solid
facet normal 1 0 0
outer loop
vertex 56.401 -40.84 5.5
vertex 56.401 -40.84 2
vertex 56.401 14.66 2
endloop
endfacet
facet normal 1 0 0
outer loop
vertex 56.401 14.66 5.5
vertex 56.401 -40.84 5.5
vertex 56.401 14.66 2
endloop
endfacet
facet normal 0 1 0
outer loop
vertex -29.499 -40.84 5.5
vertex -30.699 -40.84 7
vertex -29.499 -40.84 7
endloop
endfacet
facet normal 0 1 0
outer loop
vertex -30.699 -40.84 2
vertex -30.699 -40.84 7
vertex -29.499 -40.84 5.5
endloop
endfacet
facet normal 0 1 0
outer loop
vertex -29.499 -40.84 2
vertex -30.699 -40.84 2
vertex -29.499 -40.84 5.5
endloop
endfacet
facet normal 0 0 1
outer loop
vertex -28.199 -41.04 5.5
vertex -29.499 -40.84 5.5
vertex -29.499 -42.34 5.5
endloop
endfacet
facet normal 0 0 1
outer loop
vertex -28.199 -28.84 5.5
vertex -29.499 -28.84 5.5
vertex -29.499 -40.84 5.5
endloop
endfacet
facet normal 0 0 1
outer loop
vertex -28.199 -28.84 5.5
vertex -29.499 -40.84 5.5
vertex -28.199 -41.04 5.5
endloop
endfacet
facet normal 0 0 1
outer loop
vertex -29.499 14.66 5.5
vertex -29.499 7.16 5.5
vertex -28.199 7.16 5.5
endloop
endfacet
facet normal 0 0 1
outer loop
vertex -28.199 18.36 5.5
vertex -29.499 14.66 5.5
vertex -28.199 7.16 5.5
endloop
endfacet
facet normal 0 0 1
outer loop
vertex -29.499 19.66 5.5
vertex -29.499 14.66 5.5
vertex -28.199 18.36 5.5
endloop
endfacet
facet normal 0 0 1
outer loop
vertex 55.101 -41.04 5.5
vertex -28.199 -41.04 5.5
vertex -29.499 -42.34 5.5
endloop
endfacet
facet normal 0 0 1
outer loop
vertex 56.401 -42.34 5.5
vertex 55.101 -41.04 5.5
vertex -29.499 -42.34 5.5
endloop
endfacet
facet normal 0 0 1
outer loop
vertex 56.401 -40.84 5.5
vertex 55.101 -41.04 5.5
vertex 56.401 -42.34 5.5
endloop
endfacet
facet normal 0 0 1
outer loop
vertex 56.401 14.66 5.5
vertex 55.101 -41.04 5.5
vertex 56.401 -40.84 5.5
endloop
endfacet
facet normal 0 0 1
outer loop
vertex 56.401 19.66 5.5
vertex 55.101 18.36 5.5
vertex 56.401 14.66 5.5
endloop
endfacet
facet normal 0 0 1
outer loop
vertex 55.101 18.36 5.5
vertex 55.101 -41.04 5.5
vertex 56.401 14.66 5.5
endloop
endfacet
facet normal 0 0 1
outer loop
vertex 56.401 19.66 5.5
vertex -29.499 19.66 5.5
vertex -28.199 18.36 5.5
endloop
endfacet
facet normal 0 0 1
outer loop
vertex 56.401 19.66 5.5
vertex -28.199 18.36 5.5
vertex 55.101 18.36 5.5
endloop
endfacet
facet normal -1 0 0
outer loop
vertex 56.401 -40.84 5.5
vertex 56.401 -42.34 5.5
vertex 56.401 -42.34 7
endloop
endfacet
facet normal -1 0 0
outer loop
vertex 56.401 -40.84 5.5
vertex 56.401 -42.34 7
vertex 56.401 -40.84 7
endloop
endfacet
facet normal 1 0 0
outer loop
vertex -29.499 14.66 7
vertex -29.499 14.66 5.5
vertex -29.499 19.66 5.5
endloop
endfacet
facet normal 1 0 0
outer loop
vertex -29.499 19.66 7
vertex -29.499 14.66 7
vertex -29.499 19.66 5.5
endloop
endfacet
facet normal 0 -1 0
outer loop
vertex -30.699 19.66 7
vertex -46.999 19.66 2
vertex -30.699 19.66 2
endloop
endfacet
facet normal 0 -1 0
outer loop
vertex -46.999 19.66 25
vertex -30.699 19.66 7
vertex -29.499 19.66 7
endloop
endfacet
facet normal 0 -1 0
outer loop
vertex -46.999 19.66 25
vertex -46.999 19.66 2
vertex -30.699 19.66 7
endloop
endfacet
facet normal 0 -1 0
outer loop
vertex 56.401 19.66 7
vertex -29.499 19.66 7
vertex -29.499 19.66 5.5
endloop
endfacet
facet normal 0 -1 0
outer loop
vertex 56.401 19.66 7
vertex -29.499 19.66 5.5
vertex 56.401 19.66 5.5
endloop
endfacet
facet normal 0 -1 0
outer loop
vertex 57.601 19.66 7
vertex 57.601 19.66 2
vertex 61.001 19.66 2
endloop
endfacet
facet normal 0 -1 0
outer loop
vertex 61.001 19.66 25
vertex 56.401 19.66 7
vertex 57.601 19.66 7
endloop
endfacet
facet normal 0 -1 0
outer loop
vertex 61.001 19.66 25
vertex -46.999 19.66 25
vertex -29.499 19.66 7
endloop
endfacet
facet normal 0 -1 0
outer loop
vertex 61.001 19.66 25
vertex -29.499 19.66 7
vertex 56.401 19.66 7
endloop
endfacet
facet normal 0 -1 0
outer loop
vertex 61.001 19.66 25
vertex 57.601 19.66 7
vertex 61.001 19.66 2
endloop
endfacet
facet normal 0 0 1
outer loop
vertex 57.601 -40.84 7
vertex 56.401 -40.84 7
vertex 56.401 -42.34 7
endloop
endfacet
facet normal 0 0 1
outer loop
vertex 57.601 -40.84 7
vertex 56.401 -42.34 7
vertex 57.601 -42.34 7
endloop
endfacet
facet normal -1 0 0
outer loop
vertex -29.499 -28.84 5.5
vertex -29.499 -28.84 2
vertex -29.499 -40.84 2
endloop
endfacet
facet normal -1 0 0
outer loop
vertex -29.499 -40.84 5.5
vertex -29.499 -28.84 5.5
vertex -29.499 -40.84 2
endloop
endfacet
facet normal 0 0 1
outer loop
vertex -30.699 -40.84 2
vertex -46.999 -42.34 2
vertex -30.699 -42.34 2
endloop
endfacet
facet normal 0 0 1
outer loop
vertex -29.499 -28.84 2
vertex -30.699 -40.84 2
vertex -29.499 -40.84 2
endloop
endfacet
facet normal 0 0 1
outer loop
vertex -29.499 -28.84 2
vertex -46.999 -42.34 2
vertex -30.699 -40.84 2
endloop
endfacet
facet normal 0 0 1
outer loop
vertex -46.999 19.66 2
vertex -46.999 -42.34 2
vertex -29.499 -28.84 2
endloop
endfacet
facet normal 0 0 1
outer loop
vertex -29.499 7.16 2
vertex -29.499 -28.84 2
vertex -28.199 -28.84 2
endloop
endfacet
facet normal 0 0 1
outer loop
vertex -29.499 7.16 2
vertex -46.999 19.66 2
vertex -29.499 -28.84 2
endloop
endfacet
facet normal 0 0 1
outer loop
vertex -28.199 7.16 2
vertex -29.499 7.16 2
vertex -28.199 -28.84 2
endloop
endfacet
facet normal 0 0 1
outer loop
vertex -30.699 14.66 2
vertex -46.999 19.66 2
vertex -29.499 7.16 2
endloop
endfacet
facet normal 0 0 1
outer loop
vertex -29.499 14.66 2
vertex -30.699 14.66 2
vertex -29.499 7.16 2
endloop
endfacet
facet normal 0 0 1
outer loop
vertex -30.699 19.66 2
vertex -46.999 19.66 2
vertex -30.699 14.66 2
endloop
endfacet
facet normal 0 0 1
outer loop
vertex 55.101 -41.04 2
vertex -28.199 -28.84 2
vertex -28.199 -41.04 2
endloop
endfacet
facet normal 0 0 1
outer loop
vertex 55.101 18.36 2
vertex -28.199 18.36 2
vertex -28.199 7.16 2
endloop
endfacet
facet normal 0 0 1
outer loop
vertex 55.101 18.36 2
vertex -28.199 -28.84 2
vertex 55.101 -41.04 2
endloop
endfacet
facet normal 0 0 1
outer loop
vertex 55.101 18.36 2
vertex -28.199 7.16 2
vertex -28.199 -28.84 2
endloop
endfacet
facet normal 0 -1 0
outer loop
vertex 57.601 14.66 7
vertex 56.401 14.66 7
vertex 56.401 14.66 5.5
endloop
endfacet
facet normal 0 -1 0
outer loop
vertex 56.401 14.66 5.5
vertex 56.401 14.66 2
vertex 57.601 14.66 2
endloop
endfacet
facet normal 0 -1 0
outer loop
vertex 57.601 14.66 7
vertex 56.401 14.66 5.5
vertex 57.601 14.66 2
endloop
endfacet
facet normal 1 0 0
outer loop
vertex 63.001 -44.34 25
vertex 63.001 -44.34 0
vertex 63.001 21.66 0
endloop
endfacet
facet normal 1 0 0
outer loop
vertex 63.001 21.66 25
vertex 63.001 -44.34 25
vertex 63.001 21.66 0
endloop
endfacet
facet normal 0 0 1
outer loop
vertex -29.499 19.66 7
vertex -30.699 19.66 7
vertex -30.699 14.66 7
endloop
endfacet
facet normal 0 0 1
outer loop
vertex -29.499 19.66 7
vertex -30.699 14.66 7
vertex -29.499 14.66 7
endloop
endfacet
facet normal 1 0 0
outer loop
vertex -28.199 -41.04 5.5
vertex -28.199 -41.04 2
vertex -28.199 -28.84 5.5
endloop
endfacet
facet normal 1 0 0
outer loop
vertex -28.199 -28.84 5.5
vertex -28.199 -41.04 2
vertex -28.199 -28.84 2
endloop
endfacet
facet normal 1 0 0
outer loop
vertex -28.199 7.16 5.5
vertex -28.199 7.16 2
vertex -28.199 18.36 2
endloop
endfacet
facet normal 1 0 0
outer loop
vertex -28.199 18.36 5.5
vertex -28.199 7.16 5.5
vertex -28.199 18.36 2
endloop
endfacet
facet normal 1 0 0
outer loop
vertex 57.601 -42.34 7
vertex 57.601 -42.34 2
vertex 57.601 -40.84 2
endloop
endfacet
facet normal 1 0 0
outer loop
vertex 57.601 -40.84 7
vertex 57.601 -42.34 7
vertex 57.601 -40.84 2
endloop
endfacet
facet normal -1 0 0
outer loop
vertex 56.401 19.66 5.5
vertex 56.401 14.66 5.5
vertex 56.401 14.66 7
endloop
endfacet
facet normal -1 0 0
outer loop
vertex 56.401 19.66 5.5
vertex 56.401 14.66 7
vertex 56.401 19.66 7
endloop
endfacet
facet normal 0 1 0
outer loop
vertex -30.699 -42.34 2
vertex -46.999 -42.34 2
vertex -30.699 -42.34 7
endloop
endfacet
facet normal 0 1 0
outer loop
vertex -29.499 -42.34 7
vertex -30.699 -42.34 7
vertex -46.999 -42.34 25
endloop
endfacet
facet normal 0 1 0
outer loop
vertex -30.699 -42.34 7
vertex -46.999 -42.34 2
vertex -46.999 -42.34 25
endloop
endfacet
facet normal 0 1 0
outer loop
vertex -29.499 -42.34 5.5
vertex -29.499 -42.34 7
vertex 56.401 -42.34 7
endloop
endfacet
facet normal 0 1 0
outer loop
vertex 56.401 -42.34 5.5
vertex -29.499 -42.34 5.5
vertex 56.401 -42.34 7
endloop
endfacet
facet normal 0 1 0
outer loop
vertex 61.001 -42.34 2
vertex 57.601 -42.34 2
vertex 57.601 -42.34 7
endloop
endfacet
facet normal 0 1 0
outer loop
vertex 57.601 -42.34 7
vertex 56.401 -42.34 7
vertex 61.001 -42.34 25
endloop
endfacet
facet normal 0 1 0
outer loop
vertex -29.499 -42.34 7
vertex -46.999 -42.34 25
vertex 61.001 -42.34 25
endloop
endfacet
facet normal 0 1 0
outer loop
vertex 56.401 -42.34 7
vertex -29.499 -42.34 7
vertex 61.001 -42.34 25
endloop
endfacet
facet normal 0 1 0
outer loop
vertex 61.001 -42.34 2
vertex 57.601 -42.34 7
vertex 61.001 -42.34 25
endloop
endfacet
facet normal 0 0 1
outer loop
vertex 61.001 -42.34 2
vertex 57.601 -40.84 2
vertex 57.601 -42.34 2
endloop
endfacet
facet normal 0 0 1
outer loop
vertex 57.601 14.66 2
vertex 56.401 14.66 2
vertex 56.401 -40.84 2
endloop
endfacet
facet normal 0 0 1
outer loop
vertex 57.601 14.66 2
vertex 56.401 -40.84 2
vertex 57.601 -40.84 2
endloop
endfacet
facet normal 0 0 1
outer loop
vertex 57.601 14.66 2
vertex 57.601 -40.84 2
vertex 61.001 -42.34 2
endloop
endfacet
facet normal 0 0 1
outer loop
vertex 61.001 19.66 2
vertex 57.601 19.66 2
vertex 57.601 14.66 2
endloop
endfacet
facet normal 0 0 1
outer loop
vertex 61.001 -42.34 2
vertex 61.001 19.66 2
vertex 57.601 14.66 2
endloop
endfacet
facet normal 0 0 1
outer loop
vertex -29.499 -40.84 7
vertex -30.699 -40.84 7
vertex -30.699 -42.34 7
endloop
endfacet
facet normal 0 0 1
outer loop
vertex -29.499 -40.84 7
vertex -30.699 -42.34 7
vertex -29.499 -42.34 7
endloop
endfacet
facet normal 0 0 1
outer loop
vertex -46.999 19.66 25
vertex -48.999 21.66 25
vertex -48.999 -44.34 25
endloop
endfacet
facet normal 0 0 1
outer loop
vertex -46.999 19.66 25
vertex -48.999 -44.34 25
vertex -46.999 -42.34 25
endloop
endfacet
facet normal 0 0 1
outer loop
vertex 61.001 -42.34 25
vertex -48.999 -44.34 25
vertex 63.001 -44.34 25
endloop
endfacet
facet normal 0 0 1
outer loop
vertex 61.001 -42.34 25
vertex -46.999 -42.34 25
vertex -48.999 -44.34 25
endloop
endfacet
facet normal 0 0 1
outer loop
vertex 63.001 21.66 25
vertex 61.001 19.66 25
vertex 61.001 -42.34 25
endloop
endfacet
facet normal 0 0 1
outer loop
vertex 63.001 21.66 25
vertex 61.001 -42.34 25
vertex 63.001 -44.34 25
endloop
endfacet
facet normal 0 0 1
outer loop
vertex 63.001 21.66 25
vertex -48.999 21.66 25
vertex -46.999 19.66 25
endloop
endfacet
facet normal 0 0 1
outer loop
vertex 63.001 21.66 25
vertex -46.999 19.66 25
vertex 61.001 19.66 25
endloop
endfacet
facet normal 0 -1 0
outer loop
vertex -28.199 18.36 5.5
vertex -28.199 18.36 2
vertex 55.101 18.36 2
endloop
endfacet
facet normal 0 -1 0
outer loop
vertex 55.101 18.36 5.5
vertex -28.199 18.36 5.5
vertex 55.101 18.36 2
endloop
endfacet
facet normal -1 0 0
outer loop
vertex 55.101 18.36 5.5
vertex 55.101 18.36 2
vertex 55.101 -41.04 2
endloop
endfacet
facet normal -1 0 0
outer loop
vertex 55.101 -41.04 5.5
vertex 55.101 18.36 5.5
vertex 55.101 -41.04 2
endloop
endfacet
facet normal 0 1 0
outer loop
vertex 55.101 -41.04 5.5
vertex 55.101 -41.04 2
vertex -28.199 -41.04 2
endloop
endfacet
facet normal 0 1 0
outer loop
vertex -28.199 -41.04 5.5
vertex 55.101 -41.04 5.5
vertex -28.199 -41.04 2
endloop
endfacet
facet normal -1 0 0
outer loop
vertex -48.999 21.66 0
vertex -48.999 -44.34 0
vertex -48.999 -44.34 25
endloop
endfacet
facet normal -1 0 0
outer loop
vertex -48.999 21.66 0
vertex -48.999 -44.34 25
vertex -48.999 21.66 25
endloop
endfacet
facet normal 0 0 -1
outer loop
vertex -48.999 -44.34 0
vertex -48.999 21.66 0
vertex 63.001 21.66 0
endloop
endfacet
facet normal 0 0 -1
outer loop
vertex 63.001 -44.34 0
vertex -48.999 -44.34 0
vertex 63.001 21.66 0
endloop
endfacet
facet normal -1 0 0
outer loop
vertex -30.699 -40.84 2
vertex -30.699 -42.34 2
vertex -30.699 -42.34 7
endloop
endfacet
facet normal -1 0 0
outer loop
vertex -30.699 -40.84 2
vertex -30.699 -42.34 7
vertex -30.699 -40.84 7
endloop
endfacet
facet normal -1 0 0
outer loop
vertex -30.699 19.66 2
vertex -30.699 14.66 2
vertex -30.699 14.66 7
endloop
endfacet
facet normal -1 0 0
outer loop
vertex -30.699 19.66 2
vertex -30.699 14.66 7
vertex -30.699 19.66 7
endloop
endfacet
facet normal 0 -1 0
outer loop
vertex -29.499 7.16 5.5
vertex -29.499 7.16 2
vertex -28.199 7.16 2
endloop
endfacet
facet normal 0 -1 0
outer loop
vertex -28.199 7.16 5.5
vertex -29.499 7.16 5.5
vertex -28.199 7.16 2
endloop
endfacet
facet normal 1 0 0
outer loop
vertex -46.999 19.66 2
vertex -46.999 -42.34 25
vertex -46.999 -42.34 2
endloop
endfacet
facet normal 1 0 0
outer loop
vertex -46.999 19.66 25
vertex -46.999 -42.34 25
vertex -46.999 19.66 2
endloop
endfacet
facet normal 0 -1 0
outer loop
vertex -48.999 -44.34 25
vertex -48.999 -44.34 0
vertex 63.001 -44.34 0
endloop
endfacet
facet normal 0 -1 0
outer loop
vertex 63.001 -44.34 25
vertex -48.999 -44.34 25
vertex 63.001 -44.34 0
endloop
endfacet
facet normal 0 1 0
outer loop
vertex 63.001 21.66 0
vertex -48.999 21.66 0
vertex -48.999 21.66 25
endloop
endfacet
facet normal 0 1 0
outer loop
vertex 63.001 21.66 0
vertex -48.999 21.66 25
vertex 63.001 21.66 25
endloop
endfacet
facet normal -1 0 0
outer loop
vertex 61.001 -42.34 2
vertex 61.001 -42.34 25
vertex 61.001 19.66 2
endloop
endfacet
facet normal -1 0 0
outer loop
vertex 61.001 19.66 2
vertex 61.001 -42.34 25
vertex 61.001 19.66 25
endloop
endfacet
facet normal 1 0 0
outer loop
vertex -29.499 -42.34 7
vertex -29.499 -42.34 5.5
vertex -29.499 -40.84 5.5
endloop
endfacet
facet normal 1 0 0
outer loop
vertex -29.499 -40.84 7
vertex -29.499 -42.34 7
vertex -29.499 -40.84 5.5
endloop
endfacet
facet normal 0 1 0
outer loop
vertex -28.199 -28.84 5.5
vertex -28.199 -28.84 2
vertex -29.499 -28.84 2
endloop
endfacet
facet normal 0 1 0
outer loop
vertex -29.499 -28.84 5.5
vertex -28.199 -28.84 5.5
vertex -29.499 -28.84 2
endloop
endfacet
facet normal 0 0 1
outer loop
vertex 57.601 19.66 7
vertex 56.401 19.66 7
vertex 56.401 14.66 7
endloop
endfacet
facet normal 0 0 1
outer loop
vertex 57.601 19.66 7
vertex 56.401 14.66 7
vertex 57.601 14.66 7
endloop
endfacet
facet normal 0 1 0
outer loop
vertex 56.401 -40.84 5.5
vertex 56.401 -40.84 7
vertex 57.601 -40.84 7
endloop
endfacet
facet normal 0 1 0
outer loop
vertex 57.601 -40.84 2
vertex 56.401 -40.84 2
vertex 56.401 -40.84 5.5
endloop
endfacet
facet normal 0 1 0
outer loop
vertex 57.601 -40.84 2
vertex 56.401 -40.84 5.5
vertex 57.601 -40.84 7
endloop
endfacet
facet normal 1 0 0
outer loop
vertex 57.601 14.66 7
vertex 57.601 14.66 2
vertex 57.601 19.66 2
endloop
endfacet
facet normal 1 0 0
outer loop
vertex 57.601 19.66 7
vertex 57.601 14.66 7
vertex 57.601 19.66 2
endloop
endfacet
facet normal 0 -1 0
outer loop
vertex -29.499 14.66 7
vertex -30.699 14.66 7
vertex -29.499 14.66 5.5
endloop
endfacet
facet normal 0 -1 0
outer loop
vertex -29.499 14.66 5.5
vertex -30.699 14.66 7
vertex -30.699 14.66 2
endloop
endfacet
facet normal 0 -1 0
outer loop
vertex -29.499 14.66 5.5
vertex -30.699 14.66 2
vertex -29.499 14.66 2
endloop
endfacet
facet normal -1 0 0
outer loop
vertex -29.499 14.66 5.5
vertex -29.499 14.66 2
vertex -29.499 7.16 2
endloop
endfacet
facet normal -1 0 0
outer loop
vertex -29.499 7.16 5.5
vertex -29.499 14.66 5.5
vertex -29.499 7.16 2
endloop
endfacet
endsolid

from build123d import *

# Parameters (mm, degrees)
F0_W     = 112
F0_H     = 66
F1_DEPTH = 25
F2_W     = 108
F2_H     = 62
F3_DEPTH = 23
F5_DEPTH = 3.5
F6_W     = 1.2
F6_H     = 5
F6_H_2   = 1.5
F7_DEPTH = 5


with BuildPart() as f1:
    # F0 (on Top) → F1 (new body)
    with BuildSketch(Plane.XY):
        with Locations((7.001376, -11.34)):
            Rectangle(F0_W, F0_H)
    extrude(amount=F1_DEPTH)

    # F2 (on face) → F3 (cut)
    with BuildSketch(Plane.XY.offset(25)):
        with Locations((7.001376, -11.34)):
            Rectangle(F2_W, F2_H)
    extrude(amount=-F3_DEPTH, mode=Mode.SUBTRACT)

    # F4 (on face) → F5 (join)
    with BuildSketch(Plane.XY.offset(2)):
        Polygon((-28.198624, 7.16), (-28.198624, 18.36), (55.101376, 18.36), (55.101376, -41.04), (-28.198624, -41.04), (-28.198624, -28.84), (-29.498624, -28.84), (-29.498624, -42.34), (56.401376, -42.34), (56.401376, 19.66), (-29.498624, 19.66), (-29.498624, 7.16), align=None)
    extrude(amount=F5_DEPTH)

    # F6 (on face) → F7 (join)
    with BuildSketch(Plane.XY.offset(2)):
        with Locations((57.001376, 17.16)):
            Rectangle(F6_W, F6_H)
        with Locations((-30.098624, -41.59)):
            Rectangle(F6_W, F6_H_2)
        with Locations((57.001376, -41.59)):
            Rectangle(F6_W, F6_H_2)
        with Locations((-30.098624, 17.16)):
            Rectangle(F6_W, F6_H)
    extrude(amount=F7_DEPTH)


solid = f1.part
